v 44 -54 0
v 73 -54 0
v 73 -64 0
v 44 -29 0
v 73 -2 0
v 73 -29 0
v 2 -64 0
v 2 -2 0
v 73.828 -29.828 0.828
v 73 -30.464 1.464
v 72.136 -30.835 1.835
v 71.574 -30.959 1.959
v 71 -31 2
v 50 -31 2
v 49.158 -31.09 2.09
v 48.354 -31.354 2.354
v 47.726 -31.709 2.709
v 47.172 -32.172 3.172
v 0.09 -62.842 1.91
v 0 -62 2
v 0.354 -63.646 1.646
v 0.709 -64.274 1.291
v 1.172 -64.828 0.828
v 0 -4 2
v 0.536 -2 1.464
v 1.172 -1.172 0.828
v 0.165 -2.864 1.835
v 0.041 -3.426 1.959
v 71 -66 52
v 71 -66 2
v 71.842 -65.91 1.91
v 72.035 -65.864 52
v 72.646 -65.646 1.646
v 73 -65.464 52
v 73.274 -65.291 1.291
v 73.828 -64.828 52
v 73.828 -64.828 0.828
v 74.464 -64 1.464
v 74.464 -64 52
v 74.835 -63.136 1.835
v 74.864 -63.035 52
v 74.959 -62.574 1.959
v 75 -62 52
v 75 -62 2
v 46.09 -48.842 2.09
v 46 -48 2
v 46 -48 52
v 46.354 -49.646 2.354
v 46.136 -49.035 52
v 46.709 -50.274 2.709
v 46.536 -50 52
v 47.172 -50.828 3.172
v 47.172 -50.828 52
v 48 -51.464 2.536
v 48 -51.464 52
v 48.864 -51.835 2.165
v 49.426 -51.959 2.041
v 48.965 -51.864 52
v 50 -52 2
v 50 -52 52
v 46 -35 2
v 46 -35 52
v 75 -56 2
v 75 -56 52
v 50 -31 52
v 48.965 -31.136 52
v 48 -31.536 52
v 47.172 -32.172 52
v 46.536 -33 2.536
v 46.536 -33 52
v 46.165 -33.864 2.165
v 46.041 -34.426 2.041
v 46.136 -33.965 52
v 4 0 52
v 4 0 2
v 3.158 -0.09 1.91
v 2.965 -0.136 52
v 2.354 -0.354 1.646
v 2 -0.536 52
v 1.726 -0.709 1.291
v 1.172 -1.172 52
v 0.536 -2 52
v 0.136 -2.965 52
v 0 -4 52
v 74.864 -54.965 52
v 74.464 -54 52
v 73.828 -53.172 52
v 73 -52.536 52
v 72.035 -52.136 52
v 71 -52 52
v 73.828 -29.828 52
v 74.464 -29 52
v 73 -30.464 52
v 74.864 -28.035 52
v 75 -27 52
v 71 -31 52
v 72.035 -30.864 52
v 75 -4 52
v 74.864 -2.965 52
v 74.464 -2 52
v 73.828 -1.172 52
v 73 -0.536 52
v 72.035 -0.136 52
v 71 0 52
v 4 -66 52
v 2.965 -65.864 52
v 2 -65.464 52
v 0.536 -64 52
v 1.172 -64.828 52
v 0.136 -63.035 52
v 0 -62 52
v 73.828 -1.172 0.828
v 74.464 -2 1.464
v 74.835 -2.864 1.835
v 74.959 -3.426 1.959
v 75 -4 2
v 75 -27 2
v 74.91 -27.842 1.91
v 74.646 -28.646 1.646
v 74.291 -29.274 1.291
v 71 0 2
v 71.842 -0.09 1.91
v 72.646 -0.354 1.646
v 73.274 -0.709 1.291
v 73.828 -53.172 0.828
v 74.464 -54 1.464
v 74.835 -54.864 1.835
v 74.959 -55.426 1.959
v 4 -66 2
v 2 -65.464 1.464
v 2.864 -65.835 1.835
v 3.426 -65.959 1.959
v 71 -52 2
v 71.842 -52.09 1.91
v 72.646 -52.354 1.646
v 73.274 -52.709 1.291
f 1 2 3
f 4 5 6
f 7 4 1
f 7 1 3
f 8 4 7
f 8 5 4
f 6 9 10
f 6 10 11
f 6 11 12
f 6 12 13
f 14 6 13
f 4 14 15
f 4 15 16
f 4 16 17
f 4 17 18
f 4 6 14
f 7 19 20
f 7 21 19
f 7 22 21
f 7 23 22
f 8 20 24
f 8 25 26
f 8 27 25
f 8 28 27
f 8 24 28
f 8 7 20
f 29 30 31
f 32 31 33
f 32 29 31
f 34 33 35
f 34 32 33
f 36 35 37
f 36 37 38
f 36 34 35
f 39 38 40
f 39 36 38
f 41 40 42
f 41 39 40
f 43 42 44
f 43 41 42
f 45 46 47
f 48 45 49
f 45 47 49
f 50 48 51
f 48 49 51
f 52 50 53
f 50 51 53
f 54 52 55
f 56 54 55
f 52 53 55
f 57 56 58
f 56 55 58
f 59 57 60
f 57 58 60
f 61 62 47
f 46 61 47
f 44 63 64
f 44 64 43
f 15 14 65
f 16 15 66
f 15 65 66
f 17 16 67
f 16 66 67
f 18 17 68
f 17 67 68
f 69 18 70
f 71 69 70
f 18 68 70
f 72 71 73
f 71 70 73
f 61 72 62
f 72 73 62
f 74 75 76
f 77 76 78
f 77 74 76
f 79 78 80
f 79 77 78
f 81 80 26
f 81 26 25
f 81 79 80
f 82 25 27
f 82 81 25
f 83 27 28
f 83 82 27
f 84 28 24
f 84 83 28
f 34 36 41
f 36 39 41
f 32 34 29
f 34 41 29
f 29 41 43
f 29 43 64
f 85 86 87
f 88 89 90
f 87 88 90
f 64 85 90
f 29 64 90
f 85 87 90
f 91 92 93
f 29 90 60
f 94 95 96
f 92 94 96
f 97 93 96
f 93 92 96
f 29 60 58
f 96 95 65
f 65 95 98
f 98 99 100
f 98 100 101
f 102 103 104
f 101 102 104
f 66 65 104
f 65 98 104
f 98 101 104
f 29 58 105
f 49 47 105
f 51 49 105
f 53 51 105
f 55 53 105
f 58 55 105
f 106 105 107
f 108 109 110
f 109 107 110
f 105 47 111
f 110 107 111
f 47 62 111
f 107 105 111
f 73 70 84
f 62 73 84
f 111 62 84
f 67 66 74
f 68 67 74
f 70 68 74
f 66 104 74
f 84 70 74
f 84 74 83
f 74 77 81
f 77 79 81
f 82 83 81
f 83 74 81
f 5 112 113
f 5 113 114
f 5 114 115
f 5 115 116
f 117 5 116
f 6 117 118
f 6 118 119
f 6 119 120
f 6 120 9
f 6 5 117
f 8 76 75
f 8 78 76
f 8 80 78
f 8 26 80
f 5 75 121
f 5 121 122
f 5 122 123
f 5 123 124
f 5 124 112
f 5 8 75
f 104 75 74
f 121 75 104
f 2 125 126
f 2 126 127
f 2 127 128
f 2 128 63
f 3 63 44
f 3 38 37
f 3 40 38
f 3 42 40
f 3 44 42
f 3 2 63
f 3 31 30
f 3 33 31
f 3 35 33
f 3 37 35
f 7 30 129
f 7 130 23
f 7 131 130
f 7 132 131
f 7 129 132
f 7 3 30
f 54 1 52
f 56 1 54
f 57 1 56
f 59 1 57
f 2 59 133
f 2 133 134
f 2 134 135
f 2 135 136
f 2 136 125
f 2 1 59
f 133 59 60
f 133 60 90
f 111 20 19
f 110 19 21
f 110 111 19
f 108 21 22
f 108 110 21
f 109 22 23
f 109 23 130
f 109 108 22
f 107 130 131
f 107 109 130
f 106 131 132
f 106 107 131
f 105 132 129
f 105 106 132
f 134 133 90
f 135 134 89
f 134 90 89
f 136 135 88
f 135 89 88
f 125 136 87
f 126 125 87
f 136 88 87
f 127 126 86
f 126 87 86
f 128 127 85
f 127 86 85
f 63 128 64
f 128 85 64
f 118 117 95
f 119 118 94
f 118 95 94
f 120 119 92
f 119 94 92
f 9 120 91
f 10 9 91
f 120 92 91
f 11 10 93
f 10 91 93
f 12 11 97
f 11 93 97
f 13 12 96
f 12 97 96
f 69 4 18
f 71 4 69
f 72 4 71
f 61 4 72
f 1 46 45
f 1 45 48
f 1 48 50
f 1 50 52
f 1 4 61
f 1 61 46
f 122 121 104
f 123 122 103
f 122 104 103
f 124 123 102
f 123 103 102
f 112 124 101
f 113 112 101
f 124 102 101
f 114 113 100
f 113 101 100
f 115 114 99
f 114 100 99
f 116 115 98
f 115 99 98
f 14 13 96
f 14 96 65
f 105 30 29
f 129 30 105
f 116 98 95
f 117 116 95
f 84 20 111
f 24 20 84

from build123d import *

# Parameters (mm, degrees)
PAD_DEPTH    = 52
CHAMFER_SIZE = 2
FILLET_R     = 4


with BuildPart() as part:
    # Sketch → Pad (new body)
    with BuildSketch(Plane.XY):
        Polygon((0, 0), (75, 0), (75, -31), (46, -31), (46, -52), (75, -52), (75, -66), (0, -66), align=None)
    extrude(amount=PAD_DEPTH)

    # Chamfer
    chamfer_edges = [part.edges().sort_by_distance(p)[0] for p in [
        (37.5, 0, 0),
        (75, -15.5, 0),
        (60.5, -31, 0),
        (46, -41.5, 0),
        (60.5, -52, 0),
        (75, -59, 0),
        (37.5, -66, 0),
        (0, -33, 0),
    ]]
    chamfer(chamfer_edges, length=CHAMFER_SIZE)

    # Fillet
    fillet_edges = [part.edges().sort_by_distance(p)[0] for p in [
        (0, -66, 27),
        (75, -66, 27),
        (75, -52, 27),
        (75, -31, 27),
        (75, 0, 27),
        (46, -52, 27),
        (46, -31, 27),
        (0, 0, 27),
    ]]
    fillet(fillet_edges, radius=FILLET_R)


solid = part.part
